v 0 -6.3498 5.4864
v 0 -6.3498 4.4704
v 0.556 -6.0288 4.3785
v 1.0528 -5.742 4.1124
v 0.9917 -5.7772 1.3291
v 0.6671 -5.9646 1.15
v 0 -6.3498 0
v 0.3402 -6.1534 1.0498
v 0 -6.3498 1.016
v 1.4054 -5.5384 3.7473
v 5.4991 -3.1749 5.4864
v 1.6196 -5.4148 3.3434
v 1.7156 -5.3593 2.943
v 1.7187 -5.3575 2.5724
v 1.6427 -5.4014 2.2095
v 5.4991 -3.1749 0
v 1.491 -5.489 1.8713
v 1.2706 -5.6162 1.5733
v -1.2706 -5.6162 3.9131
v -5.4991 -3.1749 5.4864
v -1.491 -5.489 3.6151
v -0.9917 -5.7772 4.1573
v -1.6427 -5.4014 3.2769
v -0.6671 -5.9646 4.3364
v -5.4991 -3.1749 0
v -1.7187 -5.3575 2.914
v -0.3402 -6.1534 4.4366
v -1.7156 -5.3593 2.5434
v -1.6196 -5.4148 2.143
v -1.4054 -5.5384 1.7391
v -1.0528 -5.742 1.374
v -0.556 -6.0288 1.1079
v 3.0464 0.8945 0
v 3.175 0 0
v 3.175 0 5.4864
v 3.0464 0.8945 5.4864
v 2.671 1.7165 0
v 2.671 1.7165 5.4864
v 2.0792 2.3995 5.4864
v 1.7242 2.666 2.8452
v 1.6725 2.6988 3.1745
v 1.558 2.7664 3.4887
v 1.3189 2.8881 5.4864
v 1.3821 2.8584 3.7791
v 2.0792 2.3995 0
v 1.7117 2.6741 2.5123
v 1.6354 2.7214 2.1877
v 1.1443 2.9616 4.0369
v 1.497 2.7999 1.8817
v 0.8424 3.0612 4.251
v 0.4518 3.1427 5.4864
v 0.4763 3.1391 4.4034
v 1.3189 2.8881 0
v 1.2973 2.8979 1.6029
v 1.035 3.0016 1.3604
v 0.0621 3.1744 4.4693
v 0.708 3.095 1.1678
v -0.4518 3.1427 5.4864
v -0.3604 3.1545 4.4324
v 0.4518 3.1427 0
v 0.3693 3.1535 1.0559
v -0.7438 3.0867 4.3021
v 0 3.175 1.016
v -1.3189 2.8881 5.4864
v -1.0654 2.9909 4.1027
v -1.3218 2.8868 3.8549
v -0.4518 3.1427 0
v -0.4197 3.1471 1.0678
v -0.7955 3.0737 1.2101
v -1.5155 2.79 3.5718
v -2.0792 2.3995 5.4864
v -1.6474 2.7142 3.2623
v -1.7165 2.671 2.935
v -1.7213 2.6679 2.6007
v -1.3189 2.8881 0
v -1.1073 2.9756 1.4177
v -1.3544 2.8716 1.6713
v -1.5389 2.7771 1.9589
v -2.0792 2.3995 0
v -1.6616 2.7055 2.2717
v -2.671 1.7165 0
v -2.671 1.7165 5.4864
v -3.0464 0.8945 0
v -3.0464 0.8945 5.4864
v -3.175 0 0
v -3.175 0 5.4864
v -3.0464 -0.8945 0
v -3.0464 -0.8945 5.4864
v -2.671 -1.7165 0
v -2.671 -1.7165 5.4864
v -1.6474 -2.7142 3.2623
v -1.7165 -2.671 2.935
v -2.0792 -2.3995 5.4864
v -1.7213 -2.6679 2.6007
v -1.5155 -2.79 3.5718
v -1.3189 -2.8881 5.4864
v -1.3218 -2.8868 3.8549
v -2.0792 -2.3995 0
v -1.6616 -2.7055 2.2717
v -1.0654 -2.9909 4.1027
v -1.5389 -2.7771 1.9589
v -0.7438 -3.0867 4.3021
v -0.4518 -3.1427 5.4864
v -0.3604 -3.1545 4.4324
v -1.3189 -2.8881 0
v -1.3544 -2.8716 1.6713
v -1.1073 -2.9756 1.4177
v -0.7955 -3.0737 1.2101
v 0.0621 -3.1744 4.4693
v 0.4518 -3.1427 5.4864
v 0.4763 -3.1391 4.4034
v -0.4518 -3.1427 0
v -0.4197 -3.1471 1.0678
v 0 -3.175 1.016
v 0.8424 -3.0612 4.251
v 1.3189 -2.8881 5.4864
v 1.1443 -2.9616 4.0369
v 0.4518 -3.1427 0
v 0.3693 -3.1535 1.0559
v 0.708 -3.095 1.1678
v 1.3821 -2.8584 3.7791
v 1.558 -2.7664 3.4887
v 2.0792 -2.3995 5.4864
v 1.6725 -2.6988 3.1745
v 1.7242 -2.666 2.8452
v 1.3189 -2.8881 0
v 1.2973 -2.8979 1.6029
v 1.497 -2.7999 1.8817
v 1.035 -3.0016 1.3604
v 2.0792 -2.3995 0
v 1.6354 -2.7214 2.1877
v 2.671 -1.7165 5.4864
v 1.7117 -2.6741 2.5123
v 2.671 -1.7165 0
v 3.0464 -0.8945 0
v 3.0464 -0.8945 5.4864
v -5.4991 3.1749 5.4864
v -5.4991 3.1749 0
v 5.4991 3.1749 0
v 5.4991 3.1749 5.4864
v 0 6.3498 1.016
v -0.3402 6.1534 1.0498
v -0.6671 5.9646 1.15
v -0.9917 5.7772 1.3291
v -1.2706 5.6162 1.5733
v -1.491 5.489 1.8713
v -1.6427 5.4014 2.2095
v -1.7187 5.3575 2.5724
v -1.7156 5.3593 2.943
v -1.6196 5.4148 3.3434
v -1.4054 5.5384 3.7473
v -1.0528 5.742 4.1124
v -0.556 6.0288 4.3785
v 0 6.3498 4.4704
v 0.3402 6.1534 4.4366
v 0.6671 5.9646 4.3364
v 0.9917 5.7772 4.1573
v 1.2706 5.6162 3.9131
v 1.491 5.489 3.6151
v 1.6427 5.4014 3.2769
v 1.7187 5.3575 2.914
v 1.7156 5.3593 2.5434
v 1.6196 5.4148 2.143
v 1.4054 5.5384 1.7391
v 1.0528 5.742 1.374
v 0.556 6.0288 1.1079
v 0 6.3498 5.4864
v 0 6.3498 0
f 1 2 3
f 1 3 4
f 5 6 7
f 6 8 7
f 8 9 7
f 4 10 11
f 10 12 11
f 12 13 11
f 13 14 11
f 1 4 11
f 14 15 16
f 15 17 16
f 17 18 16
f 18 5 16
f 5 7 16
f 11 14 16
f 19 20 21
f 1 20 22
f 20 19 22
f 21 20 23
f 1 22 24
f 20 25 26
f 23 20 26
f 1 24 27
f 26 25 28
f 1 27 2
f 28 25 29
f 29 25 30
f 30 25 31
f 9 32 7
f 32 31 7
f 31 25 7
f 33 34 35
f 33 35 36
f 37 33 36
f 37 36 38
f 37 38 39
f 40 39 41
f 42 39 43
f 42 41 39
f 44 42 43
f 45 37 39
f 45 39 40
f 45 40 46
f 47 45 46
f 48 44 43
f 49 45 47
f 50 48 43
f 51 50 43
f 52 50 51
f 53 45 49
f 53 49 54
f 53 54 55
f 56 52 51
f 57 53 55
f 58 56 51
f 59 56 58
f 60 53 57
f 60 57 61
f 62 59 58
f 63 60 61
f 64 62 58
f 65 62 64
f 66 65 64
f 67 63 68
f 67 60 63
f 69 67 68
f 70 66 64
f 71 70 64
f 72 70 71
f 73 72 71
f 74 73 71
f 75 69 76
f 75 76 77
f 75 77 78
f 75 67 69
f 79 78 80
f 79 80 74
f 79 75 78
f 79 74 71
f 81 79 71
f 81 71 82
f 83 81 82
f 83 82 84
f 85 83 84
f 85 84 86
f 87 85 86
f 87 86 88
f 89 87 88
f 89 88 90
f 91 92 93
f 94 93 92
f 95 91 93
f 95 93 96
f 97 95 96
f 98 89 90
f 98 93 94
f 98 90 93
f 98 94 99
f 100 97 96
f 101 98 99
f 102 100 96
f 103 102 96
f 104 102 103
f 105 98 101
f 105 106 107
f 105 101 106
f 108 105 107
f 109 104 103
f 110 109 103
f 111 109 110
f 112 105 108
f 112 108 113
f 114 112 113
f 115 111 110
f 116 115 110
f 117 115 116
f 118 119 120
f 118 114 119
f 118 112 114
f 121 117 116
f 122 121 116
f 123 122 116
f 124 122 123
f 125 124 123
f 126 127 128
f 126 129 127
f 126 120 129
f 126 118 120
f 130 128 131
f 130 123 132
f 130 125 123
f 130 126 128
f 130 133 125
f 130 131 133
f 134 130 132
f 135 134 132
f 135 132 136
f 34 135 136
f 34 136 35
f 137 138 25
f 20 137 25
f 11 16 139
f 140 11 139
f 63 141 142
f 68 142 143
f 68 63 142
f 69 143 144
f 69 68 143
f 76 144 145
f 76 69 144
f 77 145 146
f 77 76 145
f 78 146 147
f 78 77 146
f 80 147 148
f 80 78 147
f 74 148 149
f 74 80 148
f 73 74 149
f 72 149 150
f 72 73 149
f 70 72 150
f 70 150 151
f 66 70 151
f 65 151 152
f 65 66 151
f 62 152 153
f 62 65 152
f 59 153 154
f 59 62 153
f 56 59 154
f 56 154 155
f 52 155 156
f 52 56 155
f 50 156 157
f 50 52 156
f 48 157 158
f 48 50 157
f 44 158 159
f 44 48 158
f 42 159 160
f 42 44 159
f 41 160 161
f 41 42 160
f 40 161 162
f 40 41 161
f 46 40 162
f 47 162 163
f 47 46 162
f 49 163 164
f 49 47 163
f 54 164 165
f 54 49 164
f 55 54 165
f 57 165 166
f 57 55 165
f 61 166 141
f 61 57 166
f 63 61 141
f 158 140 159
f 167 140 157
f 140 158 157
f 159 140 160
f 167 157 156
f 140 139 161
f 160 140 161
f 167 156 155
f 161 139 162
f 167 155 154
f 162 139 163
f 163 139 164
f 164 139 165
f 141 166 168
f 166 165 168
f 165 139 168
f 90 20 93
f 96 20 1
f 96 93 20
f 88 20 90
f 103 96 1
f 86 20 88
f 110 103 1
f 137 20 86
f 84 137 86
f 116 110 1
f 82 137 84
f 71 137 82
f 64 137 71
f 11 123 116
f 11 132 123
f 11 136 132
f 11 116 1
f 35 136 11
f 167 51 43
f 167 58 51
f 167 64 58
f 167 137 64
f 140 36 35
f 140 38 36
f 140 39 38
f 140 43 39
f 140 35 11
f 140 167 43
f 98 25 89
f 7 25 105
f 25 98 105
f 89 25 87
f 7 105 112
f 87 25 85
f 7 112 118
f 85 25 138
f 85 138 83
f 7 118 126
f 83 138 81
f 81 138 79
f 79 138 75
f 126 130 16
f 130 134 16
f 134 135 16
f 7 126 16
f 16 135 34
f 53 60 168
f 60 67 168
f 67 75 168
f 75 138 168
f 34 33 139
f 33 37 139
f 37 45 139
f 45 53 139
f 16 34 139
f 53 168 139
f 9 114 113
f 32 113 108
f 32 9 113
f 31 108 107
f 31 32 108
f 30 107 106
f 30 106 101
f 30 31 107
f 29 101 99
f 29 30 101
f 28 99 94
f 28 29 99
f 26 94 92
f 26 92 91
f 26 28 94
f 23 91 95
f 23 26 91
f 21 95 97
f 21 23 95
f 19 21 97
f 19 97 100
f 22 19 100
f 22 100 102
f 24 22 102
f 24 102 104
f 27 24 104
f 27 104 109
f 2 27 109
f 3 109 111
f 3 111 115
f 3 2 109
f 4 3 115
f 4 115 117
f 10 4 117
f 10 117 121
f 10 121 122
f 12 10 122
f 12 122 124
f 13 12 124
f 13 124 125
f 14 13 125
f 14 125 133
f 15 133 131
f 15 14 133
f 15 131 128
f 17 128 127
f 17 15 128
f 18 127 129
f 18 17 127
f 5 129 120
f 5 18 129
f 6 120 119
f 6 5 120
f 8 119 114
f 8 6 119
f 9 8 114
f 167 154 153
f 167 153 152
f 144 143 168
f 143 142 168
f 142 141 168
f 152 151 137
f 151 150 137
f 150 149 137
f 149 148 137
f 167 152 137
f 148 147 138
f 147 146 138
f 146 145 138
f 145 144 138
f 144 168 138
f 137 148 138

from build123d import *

# Parameters (mm, degrees)
SKETCH1_R          = 3.175
EXTRUDE1_DEPTH     = 5.4864
CUT_EXTRUDE1_START = -6.349814
SKETCH2_R          = 1.7272
CUT_EXTRUDE1_DEPTH = 12.699628


with BuildPart() as part:
    # Sketch1 → Extrude1 (new body)
    with BuildSketch(Plane.XY):
        Polygon((0, 6.349813731), (-5.4991, 3.174906865), (-5.4991, -3.174906865), (0, -6.349813731), (5.4991, -3.174906865), (5.4991, 3.174906865), align=None)
        Circle(SKETCH1_R, mode=Mode.SUBTRACT)
    extrude(amount=EXTRUDE1_DEPTH)

    # Sketch2 → Cut-Extrude1 (cut)
    with BuildSketch(Plane(origin=(0, 0, 0), x_dir=(0, 0, -1), z_dir=(0, 1, 0)).offset(CUT_EXTRUDE1_START)):
        with Locations((-2.7432, 0)):
            Circle(SKETCH2_R)
    extrude(amount=CUT_EXTRUDE1_DEPTH, mode=Mode.SUBTRACT)


solid = part.part
